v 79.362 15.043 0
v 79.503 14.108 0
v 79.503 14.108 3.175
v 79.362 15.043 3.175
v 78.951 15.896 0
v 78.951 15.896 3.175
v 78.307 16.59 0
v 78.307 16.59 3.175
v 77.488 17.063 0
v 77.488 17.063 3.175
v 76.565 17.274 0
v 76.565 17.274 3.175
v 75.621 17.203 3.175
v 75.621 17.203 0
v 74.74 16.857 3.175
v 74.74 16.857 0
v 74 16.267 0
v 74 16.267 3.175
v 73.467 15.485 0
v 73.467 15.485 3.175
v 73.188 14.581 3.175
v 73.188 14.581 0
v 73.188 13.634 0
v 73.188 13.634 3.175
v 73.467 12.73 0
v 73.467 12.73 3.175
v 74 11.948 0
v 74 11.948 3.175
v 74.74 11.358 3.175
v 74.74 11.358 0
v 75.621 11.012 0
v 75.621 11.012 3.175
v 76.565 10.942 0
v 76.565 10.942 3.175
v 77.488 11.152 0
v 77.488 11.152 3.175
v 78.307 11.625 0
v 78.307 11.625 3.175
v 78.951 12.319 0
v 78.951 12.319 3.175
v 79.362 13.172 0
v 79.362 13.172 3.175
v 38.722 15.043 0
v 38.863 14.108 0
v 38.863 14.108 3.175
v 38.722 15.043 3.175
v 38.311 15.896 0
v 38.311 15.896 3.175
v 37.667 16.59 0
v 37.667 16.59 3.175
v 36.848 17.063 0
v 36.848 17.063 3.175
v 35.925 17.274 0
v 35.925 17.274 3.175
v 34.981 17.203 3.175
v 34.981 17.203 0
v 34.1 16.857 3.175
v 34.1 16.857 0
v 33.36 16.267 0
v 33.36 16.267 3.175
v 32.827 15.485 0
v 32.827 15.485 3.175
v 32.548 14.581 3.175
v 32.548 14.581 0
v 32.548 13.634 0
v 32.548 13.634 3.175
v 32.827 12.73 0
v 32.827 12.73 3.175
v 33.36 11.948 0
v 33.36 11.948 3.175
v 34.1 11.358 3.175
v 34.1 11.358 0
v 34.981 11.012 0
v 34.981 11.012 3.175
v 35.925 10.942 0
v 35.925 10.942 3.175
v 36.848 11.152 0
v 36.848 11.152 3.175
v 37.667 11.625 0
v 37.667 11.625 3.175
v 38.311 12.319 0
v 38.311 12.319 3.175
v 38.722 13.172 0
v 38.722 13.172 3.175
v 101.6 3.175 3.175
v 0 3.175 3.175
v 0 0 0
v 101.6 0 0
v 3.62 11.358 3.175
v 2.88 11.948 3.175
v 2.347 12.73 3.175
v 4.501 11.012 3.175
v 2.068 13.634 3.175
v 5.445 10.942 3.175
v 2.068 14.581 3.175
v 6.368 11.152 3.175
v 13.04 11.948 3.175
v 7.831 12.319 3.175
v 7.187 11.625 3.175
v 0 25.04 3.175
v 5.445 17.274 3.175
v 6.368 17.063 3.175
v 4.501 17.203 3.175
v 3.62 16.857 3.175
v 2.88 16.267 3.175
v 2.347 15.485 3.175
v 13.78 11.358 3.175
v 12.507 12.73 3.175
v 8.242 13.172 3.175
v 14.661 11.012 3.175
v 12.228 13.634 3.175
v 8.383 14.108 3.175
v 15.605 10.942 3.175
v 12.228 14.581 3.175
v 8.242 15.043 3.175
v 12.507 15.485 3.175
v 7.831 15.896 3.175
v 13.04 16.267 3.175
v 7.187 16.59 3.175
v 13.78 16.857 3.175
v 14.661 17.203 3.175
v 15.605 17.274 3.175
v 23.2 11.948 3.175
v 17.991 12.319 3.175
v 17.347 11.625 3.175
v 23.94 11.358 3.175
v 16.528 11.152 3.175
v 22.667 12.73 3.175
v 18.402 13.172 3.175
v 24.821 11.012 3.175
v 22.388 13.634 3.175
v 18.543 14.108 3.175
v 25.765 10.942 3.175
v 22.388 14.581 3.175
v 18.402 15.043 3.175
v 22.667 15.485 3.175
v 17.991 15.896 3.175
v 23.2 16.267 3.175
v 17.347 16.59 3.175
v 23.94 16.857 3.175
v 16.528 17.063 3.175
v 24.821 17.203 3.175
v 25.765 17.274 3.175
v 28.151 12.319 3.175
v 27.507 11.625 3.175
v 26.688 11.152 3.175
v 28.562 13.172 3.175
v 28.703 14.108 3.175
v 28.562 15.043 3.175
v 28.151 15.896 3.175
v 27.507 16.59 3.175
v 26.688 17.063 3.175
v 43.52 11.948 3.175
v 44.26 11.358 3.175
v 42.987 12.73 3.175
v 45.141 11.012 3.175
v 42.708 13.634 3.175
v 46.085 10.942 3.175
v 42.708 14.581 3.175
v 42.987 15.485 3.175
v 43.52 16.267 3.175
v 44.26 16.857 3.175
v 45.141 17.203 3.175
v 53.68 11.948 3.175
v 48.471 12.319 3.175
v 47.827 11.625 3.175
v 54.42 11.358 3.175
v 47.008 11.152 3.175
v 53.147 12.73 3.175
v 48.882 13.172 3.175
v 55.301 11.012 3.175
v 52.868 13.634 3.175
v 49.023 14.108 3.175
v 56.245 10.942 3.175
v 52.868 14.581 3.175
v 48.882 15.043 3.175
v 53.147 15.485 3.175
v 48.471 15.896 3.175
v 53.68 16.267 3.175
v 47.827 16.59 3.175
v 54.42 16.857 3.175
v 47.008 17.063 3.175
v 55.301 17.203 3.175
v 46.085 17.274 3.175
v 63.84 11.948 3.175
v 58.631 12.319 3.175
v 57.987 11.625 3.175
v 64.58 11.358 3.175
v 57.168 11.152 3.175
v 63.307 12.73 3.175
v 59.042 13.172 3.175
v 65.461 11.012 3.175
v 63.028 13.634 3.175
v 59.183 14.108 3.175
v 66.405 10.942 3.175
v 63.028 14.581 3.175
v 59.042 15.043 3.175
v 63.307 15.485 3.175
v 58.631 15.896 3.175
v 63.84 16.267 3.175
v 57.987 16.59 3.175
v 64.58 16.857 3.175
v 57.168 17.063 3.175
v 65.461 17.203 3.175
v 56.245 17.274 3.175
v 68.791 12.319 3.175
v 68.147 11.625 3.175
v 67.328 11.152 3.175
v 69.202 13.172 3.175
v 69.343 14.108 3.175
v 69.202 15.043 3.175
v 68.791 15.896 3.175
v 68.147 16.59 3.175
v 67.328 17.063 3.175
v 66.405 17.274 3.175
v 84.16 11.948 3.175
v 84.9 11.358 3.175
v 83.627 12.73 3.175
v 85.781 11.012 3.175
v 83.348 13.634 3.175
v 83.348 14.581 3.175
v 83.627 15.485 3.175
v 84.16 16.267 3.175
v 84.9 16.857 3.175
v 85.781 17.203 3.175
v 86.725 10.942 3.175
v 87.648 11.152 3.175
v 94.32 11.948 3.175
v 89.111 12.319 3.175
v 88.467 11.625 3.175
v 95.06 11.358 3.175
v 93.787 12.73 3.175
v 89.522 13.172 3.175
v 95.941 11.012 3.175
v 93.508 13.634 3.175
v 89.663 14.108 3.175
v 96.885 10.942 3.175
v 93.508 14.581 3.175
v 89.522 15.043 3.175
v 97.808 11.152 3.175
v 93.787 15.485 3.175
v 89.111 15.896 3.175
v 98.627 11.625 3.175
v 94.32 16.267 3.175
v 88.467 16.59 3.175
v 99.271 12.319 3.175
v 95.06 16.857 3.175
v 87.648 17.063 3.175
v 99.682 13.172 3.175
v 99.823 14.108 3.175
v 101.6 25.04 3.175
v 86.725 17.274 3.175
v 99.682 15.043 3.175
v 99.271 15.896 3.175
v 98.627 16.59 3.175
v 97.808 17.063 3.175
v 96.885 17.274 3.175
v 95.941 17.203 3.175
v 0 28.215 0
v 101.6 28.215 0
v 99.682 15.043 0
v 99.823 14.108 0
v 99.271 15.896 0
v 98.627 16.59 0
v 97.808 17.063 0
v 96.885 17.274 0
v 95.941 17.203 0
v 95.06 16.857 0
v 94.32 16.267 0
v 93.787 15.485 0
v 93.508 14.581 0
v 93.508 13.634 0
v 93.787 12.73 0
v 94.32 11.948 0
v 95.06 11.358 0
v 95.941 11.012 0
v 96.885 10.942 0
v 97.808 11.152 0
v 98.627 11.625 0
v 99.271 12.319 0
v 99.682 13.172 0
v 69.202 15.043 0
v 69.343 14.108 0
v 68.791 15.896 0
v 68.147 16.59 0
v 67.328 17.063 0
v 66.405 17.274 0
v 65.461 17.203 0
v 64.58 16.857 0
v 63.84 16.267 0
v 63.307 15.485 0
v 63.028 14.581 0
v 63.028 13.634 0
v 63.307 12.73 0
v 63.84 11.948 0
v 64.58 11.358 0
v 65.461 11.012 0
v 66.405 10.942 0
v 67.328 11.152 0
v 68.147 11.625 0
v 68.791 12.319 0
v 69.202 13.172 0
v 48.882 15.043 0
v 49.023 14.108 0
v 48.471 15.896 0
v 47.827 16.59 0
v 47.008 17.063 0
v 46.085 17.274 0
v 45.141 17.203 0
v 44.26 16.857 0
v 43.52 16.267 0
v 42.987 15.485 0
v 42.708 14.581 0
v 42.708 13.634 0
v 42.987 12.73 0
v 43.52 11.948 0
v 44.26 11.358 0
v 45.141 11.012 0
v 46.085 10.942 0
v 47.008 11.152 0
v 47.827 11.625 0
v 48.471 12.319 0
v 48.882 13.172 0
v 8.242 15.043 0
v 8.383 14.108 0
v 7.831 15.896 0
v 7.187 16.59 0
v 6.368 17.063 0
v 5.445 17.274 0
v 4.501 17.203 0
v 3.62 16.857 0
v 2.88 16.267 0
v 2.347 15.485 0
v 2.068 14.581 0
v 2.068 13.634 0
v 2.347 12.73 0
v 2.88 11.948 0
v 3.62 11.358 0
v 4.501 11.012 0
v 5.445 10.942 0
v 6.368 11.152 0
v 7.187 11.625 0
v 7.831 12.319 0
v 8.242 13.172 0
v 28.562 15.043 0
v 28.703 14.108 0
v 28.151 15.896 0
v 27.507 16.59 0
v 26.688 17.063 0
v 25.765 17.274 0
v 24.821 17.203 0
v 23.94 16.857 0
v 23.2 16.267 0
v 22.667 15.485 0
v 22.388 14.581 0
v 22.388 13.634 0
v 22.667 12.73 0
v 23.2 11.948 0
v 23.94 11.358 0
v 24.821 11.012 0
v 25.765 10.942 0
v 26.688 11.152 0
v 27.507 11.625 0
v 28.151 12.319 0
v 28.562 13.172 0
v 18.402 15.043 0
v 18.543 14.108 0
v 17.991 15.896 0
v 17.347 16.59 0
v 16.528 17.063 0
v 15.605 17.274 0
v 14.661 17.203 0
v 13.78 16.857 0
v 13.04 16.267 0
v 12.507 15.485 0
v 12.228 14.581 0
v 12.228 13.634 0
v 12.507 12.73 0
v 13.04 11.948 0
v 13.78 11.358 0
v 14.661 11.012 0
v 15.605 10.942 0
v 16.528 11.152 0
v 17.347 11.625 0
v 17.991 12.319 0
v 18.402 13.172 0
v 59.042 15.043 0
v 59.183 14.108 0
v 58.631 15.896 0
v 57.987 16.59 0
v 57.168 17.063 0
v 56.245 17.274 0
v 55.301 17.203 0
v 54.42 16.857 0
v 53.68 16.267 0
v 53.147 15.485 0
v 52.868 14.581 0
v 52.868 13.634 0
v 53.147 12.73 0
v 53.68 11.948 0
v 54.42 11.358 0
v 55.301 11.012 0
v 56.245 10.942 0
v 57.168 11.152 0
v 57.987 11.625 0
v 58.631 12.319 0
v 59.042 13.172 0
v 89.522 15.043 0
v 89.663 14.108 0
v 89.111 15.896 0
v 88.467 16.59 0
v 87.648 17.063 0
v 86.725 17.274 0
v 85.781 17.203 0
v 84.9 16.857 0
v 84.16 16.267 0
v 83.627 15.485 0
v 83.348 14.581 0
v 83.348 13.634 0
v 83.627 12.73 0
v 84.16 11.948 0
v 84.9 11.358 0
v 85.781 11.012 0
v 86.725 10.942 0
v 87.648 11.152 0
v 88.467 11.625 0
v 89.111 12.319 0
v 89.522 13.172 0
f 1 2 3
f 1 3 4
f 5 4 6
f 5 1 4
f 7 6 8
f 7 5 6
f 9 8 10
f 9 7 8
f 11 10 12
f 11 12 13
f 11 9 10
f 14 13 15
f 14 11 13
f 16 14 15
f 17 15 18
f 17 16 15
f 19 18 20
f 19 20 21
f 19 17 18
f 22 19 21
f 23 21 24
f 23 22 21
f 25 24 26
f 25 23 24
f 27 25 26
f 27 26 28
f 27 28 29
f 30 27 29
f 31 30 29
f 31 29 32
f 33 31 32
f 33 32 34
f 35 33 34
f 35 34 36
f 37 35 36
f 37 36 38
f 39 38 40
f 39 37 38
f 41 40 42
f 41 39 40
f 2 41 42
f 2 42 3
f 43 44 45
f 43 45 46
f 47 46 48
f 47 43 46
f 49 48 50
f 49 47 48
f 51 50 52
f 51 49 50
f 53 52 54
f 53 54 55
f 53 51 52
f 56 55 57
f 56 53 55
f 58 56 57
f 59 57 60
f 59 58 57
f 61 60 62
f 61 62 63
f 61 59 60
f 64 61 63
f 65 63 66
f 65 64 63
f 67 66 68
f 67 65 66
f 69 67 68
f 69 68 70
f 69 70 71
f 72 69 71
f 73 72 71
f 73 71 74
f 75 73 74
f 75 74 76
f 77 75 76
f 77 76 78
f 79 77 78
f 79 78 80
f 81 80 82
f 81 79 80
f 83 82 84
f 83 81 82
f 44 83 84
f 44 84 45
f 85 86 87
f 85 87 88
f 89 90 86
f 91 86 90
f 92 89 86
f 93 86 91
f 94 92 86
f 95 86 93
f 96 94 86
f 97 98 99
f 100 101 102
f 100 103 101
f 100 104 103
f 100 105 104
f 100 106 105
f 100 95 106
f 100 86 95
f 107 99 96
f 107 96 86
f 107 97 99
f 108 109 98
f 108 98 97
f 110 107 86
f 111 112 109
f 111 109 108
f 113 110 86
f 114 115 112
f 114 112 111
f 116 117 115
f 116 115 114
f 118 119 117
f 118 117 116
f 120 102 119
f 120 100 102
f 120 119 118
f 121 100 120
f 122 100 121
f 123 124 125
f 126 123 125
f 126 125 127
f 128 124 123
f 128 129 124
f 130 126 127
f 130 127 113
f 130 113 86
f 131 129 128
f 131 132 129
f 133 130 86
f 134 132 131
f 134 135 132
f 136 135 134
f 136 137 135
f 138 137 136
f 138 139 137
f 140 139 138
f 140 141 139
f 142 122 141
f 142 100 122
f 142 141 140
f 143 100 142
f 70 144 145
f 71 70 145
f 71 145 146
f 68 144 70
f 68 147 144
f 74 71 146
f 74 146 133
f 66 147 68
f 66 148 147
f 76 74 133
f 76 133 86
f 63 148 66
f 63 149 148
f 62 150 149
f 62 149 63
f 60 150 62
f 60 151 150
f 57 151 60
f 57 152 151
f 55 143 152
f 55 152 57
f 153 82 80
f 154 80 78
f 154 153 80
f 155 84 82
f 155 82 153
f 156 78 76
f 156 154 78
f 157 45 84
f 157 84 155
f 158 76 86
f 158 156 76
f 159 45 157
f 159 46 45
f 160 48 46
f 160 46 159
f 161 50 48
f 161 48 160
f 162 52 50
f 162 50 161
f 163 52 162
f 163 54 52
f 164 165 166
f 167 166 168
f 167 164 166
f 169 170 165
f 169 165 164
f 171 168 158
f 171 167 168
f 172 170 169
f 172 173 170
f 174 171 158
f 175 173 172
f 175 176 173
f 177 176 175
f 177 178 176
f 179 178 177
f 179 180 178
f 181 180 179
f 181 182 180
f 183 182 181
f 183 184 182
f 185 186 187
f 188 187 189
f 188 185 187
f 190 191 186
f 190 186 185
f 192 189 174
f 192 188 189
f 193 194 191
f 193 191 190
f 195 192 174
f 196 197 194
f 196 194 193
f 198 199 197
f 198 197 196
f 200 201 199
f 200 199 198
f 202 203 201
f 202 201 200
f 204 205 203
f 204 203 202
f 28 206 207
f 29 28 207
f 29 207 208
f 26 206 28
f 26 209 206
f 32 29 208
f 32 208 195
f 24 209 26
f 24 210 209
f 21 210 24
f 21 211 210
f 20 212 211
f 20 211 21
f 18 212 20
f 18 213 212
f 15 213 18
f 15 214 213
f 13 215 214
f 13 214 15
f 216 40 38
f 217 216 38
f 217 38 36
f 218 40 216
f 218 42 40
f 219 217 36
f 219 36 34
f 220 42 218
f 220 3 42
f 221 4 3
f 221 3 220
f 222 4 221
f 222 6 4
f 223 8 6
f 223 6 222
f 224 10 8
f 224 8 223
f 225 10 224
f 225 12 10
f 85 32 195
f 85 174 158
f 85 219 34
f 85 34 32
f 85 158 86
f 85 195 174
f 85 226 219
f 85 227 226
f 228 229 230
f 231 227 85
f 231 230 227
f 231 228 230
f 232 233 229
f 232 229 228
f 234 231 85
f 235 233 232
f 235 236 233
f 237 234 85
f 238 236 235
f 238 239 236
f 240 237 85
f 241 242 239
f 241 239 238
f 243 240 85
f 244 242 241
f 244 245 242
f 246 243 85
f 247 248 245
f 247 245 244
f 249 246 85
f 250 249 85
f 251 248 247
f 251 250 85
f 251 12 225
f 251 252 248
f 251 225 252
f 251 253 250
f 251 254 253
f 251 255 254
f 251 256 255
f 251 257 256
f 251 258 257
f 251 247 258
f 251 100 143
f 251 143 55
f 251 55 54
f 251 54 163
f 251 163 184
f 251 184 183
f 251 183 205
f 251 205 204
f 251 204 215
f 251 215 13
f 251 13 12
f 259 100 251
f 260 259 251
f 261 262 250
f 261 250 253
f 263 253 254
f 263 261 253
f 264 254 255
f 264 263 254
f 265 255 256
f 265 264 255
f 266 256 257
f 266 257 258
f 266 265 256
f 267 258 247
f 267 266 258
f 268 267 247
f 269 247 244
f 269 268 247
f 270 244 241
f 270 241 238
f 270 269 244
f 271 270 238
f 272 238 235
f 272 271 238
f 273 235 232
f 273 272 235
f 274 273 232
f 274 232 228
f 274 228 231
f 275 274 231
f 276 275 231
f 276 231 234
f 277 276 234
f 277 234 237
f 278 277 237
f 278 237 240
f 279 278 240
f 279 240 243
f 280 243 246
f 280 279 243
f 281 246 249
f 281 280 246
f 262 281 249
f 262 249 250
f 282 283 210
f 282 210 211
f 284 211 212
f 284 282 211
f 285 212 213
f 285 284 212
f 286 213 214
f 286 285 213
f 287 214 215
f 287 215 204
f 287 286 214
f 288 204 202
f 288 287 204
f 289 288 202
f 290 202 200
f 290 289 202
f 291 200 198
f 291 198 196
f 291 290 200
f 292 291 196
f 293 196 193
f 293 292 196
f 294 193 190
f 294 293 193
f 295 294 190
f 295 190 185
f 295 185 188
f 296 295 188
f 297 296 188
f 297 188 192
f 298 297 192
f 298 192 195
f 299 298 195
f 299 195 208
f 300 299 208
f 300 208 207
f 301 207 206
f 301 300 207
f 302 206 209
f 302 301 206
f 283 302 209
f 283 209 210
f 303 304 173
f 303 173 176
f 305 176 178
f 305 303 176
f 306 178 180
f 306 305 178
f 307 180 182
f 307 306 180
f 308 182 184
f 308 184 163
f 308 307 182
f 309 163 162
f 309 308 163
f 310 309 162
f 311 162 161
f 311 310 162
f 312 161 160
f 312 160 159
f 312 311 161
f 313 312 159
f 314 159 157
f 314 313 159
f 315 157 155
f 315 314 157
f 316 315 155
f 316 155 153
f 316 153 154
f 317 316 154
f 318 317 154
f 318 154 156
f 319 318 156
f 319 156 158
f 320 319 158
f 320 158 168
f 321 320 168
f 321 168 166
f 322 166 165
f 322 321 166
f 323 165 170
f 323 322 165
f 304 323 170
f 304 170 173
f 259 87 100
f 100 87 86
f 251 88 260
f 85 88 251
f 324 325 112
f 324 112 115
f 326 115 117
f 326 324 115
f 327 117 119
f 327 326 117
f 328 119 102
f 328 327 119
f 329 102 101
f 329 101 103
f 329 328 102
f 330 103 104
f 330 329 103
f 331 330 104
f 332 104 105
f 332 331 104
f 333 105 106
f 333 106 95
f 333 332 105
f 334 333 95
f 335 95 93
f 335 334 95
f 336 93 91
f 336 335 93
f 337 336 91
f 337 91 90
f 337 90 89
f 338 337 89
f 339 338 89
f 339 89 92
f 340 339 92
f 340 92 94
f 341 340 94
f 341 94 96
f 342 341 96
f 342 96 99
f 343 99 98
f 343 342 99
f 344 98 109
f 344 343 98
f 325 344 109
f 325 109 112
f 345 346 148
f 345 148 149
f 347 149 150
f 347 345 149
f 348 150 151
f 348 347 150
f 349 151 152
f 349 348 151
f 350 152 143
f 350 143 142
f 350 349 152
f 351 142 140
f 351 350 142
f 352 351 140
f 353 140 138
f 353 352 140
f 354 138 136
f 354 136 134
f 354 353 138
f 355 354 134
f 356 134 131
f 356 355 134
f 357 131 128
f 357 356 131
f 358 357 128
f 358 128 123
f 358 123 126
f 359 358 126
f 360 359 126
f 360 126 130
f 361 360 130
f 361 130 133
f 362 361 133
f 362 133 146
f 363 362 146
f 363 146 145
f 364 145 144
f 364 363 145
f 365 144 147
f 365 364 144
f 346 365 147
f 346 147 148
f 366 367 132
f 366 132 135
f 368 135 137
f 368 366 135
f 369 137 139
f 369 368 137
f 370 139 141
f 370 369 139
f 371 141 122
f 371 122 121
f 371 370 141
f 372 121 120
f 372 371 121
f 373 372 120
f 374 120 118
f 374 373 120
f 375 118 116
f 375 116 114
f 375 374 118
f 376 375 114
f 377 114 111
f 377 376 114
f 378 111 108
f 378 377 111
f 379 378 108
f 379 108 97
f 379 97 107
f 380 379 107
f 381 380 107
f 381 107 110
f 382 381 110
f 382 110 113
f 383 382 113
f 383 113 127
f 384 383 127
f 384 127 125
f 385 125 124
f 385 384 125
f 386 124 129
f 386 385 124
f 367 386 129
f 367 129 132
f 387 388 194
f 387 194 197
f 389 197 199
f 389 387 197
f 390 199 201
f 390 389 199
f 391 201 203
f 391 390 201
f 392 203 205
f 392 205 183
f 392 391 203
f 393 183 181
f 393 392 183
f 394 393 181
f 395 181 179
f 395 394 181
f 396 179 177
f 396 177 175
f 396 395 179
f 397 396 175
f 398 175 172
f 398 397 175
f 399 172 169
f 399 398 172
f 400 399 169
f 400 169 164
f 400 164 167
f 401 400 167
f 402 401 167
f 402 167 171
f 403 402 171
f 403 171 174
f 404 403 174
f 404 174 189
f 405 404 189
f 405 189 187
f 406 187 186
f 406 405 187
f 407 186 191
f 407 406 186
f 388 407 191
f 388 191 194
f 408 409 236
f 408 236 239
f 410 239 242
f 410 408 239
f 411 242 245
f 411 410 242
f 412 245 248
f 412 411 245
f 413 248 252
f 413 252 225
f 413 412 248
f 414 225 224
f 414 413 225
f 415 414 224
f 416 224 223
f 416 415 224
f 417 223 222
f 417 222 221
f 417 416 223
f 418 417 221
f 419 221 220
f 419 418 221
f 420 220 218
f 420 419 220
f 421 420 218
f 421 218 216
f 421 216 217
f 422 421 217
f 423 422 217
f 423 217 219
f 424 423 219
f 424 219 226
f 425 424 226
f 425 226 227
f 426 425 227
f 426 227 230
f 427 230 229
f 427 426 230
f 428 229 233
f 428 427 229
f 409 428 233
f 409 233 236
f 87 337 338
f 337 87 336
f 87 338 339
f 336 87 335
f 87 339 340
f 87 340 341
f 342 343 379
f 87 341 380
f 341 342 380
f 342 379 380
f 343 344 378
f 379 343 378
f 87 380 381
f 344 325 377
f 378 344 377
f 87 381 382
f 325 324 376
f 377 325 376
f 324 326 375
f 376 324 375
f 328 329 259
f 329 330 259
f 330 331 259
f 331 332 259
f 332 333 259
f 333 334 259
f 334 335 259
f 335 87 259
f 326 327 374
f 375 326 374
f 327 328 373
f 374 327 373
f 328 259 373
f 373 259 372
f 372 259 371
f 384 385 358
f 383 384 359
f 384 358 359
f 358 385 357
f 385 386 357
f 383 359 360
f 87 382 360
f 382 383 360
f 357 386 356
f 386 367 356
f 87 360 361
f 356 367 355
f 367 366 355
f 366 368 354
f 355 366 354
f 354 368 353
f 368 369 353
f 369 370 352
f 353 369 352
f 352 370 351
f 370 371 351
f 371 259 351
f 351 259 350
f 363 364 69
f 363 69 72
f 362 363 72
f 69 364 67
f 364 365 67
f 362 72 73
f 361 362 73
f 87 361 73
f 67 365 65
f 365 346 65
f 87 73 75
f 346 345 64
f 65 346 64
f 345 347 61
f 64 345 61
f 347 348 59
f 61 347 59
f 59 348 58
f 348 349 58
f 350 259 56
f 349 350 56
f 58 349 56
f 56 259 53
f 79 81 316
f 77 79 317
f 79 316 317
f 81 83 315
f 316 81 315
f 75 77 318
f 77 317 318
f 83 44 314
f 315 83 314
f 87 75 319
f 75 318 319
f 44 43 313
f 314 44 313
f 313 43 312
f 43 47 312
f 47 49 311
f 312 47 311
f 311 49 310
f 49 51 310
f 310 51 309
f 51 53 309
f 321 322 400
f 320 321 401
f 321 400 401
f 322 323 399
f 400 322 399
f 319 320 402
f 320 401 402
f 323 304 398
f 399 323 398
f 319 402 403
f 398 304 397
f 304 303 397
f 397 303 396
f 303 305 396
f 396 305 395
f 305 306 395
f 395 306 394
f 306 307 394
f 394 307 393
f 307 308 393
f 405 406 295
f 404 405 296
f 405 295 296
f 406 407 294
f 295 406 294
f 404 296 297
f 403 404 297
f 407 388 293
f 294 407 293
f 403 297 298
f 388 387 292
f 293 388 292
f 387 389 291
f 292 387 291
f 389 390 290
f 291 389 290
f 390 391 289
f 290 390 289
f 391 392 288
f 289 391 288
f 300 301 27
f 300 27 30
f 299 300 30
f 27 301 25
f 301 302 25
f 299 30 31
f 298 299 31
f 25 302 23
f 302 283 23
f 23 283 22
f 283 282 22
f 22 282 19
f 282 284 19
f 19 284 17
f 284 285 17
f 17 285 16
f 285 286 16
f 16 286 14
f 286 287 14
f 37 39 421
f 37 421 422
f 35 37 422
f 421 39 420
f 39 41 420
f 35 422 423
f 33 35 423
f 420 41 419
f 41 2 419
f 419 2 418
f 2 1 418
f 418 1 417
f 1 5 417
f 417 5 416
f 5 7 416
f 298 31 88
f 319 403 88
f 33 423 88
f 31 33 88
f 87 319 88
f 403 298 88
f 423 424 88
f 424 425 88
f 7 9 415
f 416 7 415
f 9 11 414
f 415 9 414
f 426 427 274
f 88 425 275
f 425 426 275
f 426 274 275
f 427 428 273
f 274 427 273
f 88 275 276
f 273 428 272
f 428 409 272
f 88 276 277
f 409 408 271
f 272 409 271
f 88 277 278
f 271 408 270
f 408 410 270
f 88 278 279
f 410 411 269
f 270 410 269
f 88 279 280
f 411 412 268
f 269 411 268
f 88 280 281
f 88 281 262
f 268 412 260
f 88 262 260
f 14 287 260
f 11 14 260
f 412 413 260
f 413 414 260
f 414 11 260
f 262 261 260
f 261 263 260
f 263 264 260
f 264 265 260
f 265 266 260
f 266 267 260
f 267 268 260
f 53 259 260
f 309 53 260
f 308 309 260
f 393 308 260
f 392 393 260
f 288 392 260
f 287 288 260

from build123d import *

# Parameters (mm, degrees)
SKETCH1_W           = 101.6
SKETCH1_H           = 28.215251418
SKETCH1_R           = 3.175
BOSS_EXTRUDE1_DEPTH = 3.175
CHAMFER1_SIZE       = 3.175


with BuildPart() as part:
    # Sketch1 → Boss-Extrude1 (new body)
    with BuildSketch(Plane.XY):
        with Locations((50.8, 14.107625709)):
            Rectangle(SKETCH1_W, SKETCH1_H)
        with Locations((5.2076336, 14.107625709)):
            Circle(SKETCH1_R, mode=Mode.SUBTRACT)
        with Locations((15.3676336, 14.107625709)):
            Circle(SKETCH1_R, mode=Mode.SUBTRACT)
        with Locations((25.5276336, 14.107625709)):
            Circle(SKETCH1_R, mode=Mode.SUBTRACT)
        with Locations((35.6876336, 14.107625709)):
            Circle(SKETCH1_R, mode=Mode.SUBTRACT)
        with Locations((45.8476336, 14.107625709)):
            Circle(SKETCH1_R, mode=Mode.SUBTRACT)
        with Locations((56.0076336, 14.107625709)):
            Circle(SKETCH1_R, mode=Mode.SUBTRACT)
        with Locations((66.1676336, 14.107625709)):
            Circle(SKETCH1_R, mode=Mode.SUBTRACT)
        with Locations((76.3276336, 14.107625709)):
            Circle(SKETCH1_R, mode=Mode.SUBTRACT)
        with Locations((86.4876336, 14.107625709)):
            Circle(SKETCH1_R, mode=Mode.SUBTRACT)
        with Locations((96.6476336, 14.107625709)):
            Circle(SKETCH1_R, mode=Mode.SUBTRACT)
    extrude(amount=BOSS_EXTRUDE1_DEPTH)

    # Chamfer1
    chamfer1_edges = [part.edges().sort_by_distance(p)[0] for p in [
        (50.8, 0, 3.175),
        (50.8, 28.215251418, 3.175),
    ]]
    chamfer(chamfer1_edges, length=CHAMFER1_SIZE - 0.0001)  # a hair under: the kernel refuses the full size


solid = part.part
